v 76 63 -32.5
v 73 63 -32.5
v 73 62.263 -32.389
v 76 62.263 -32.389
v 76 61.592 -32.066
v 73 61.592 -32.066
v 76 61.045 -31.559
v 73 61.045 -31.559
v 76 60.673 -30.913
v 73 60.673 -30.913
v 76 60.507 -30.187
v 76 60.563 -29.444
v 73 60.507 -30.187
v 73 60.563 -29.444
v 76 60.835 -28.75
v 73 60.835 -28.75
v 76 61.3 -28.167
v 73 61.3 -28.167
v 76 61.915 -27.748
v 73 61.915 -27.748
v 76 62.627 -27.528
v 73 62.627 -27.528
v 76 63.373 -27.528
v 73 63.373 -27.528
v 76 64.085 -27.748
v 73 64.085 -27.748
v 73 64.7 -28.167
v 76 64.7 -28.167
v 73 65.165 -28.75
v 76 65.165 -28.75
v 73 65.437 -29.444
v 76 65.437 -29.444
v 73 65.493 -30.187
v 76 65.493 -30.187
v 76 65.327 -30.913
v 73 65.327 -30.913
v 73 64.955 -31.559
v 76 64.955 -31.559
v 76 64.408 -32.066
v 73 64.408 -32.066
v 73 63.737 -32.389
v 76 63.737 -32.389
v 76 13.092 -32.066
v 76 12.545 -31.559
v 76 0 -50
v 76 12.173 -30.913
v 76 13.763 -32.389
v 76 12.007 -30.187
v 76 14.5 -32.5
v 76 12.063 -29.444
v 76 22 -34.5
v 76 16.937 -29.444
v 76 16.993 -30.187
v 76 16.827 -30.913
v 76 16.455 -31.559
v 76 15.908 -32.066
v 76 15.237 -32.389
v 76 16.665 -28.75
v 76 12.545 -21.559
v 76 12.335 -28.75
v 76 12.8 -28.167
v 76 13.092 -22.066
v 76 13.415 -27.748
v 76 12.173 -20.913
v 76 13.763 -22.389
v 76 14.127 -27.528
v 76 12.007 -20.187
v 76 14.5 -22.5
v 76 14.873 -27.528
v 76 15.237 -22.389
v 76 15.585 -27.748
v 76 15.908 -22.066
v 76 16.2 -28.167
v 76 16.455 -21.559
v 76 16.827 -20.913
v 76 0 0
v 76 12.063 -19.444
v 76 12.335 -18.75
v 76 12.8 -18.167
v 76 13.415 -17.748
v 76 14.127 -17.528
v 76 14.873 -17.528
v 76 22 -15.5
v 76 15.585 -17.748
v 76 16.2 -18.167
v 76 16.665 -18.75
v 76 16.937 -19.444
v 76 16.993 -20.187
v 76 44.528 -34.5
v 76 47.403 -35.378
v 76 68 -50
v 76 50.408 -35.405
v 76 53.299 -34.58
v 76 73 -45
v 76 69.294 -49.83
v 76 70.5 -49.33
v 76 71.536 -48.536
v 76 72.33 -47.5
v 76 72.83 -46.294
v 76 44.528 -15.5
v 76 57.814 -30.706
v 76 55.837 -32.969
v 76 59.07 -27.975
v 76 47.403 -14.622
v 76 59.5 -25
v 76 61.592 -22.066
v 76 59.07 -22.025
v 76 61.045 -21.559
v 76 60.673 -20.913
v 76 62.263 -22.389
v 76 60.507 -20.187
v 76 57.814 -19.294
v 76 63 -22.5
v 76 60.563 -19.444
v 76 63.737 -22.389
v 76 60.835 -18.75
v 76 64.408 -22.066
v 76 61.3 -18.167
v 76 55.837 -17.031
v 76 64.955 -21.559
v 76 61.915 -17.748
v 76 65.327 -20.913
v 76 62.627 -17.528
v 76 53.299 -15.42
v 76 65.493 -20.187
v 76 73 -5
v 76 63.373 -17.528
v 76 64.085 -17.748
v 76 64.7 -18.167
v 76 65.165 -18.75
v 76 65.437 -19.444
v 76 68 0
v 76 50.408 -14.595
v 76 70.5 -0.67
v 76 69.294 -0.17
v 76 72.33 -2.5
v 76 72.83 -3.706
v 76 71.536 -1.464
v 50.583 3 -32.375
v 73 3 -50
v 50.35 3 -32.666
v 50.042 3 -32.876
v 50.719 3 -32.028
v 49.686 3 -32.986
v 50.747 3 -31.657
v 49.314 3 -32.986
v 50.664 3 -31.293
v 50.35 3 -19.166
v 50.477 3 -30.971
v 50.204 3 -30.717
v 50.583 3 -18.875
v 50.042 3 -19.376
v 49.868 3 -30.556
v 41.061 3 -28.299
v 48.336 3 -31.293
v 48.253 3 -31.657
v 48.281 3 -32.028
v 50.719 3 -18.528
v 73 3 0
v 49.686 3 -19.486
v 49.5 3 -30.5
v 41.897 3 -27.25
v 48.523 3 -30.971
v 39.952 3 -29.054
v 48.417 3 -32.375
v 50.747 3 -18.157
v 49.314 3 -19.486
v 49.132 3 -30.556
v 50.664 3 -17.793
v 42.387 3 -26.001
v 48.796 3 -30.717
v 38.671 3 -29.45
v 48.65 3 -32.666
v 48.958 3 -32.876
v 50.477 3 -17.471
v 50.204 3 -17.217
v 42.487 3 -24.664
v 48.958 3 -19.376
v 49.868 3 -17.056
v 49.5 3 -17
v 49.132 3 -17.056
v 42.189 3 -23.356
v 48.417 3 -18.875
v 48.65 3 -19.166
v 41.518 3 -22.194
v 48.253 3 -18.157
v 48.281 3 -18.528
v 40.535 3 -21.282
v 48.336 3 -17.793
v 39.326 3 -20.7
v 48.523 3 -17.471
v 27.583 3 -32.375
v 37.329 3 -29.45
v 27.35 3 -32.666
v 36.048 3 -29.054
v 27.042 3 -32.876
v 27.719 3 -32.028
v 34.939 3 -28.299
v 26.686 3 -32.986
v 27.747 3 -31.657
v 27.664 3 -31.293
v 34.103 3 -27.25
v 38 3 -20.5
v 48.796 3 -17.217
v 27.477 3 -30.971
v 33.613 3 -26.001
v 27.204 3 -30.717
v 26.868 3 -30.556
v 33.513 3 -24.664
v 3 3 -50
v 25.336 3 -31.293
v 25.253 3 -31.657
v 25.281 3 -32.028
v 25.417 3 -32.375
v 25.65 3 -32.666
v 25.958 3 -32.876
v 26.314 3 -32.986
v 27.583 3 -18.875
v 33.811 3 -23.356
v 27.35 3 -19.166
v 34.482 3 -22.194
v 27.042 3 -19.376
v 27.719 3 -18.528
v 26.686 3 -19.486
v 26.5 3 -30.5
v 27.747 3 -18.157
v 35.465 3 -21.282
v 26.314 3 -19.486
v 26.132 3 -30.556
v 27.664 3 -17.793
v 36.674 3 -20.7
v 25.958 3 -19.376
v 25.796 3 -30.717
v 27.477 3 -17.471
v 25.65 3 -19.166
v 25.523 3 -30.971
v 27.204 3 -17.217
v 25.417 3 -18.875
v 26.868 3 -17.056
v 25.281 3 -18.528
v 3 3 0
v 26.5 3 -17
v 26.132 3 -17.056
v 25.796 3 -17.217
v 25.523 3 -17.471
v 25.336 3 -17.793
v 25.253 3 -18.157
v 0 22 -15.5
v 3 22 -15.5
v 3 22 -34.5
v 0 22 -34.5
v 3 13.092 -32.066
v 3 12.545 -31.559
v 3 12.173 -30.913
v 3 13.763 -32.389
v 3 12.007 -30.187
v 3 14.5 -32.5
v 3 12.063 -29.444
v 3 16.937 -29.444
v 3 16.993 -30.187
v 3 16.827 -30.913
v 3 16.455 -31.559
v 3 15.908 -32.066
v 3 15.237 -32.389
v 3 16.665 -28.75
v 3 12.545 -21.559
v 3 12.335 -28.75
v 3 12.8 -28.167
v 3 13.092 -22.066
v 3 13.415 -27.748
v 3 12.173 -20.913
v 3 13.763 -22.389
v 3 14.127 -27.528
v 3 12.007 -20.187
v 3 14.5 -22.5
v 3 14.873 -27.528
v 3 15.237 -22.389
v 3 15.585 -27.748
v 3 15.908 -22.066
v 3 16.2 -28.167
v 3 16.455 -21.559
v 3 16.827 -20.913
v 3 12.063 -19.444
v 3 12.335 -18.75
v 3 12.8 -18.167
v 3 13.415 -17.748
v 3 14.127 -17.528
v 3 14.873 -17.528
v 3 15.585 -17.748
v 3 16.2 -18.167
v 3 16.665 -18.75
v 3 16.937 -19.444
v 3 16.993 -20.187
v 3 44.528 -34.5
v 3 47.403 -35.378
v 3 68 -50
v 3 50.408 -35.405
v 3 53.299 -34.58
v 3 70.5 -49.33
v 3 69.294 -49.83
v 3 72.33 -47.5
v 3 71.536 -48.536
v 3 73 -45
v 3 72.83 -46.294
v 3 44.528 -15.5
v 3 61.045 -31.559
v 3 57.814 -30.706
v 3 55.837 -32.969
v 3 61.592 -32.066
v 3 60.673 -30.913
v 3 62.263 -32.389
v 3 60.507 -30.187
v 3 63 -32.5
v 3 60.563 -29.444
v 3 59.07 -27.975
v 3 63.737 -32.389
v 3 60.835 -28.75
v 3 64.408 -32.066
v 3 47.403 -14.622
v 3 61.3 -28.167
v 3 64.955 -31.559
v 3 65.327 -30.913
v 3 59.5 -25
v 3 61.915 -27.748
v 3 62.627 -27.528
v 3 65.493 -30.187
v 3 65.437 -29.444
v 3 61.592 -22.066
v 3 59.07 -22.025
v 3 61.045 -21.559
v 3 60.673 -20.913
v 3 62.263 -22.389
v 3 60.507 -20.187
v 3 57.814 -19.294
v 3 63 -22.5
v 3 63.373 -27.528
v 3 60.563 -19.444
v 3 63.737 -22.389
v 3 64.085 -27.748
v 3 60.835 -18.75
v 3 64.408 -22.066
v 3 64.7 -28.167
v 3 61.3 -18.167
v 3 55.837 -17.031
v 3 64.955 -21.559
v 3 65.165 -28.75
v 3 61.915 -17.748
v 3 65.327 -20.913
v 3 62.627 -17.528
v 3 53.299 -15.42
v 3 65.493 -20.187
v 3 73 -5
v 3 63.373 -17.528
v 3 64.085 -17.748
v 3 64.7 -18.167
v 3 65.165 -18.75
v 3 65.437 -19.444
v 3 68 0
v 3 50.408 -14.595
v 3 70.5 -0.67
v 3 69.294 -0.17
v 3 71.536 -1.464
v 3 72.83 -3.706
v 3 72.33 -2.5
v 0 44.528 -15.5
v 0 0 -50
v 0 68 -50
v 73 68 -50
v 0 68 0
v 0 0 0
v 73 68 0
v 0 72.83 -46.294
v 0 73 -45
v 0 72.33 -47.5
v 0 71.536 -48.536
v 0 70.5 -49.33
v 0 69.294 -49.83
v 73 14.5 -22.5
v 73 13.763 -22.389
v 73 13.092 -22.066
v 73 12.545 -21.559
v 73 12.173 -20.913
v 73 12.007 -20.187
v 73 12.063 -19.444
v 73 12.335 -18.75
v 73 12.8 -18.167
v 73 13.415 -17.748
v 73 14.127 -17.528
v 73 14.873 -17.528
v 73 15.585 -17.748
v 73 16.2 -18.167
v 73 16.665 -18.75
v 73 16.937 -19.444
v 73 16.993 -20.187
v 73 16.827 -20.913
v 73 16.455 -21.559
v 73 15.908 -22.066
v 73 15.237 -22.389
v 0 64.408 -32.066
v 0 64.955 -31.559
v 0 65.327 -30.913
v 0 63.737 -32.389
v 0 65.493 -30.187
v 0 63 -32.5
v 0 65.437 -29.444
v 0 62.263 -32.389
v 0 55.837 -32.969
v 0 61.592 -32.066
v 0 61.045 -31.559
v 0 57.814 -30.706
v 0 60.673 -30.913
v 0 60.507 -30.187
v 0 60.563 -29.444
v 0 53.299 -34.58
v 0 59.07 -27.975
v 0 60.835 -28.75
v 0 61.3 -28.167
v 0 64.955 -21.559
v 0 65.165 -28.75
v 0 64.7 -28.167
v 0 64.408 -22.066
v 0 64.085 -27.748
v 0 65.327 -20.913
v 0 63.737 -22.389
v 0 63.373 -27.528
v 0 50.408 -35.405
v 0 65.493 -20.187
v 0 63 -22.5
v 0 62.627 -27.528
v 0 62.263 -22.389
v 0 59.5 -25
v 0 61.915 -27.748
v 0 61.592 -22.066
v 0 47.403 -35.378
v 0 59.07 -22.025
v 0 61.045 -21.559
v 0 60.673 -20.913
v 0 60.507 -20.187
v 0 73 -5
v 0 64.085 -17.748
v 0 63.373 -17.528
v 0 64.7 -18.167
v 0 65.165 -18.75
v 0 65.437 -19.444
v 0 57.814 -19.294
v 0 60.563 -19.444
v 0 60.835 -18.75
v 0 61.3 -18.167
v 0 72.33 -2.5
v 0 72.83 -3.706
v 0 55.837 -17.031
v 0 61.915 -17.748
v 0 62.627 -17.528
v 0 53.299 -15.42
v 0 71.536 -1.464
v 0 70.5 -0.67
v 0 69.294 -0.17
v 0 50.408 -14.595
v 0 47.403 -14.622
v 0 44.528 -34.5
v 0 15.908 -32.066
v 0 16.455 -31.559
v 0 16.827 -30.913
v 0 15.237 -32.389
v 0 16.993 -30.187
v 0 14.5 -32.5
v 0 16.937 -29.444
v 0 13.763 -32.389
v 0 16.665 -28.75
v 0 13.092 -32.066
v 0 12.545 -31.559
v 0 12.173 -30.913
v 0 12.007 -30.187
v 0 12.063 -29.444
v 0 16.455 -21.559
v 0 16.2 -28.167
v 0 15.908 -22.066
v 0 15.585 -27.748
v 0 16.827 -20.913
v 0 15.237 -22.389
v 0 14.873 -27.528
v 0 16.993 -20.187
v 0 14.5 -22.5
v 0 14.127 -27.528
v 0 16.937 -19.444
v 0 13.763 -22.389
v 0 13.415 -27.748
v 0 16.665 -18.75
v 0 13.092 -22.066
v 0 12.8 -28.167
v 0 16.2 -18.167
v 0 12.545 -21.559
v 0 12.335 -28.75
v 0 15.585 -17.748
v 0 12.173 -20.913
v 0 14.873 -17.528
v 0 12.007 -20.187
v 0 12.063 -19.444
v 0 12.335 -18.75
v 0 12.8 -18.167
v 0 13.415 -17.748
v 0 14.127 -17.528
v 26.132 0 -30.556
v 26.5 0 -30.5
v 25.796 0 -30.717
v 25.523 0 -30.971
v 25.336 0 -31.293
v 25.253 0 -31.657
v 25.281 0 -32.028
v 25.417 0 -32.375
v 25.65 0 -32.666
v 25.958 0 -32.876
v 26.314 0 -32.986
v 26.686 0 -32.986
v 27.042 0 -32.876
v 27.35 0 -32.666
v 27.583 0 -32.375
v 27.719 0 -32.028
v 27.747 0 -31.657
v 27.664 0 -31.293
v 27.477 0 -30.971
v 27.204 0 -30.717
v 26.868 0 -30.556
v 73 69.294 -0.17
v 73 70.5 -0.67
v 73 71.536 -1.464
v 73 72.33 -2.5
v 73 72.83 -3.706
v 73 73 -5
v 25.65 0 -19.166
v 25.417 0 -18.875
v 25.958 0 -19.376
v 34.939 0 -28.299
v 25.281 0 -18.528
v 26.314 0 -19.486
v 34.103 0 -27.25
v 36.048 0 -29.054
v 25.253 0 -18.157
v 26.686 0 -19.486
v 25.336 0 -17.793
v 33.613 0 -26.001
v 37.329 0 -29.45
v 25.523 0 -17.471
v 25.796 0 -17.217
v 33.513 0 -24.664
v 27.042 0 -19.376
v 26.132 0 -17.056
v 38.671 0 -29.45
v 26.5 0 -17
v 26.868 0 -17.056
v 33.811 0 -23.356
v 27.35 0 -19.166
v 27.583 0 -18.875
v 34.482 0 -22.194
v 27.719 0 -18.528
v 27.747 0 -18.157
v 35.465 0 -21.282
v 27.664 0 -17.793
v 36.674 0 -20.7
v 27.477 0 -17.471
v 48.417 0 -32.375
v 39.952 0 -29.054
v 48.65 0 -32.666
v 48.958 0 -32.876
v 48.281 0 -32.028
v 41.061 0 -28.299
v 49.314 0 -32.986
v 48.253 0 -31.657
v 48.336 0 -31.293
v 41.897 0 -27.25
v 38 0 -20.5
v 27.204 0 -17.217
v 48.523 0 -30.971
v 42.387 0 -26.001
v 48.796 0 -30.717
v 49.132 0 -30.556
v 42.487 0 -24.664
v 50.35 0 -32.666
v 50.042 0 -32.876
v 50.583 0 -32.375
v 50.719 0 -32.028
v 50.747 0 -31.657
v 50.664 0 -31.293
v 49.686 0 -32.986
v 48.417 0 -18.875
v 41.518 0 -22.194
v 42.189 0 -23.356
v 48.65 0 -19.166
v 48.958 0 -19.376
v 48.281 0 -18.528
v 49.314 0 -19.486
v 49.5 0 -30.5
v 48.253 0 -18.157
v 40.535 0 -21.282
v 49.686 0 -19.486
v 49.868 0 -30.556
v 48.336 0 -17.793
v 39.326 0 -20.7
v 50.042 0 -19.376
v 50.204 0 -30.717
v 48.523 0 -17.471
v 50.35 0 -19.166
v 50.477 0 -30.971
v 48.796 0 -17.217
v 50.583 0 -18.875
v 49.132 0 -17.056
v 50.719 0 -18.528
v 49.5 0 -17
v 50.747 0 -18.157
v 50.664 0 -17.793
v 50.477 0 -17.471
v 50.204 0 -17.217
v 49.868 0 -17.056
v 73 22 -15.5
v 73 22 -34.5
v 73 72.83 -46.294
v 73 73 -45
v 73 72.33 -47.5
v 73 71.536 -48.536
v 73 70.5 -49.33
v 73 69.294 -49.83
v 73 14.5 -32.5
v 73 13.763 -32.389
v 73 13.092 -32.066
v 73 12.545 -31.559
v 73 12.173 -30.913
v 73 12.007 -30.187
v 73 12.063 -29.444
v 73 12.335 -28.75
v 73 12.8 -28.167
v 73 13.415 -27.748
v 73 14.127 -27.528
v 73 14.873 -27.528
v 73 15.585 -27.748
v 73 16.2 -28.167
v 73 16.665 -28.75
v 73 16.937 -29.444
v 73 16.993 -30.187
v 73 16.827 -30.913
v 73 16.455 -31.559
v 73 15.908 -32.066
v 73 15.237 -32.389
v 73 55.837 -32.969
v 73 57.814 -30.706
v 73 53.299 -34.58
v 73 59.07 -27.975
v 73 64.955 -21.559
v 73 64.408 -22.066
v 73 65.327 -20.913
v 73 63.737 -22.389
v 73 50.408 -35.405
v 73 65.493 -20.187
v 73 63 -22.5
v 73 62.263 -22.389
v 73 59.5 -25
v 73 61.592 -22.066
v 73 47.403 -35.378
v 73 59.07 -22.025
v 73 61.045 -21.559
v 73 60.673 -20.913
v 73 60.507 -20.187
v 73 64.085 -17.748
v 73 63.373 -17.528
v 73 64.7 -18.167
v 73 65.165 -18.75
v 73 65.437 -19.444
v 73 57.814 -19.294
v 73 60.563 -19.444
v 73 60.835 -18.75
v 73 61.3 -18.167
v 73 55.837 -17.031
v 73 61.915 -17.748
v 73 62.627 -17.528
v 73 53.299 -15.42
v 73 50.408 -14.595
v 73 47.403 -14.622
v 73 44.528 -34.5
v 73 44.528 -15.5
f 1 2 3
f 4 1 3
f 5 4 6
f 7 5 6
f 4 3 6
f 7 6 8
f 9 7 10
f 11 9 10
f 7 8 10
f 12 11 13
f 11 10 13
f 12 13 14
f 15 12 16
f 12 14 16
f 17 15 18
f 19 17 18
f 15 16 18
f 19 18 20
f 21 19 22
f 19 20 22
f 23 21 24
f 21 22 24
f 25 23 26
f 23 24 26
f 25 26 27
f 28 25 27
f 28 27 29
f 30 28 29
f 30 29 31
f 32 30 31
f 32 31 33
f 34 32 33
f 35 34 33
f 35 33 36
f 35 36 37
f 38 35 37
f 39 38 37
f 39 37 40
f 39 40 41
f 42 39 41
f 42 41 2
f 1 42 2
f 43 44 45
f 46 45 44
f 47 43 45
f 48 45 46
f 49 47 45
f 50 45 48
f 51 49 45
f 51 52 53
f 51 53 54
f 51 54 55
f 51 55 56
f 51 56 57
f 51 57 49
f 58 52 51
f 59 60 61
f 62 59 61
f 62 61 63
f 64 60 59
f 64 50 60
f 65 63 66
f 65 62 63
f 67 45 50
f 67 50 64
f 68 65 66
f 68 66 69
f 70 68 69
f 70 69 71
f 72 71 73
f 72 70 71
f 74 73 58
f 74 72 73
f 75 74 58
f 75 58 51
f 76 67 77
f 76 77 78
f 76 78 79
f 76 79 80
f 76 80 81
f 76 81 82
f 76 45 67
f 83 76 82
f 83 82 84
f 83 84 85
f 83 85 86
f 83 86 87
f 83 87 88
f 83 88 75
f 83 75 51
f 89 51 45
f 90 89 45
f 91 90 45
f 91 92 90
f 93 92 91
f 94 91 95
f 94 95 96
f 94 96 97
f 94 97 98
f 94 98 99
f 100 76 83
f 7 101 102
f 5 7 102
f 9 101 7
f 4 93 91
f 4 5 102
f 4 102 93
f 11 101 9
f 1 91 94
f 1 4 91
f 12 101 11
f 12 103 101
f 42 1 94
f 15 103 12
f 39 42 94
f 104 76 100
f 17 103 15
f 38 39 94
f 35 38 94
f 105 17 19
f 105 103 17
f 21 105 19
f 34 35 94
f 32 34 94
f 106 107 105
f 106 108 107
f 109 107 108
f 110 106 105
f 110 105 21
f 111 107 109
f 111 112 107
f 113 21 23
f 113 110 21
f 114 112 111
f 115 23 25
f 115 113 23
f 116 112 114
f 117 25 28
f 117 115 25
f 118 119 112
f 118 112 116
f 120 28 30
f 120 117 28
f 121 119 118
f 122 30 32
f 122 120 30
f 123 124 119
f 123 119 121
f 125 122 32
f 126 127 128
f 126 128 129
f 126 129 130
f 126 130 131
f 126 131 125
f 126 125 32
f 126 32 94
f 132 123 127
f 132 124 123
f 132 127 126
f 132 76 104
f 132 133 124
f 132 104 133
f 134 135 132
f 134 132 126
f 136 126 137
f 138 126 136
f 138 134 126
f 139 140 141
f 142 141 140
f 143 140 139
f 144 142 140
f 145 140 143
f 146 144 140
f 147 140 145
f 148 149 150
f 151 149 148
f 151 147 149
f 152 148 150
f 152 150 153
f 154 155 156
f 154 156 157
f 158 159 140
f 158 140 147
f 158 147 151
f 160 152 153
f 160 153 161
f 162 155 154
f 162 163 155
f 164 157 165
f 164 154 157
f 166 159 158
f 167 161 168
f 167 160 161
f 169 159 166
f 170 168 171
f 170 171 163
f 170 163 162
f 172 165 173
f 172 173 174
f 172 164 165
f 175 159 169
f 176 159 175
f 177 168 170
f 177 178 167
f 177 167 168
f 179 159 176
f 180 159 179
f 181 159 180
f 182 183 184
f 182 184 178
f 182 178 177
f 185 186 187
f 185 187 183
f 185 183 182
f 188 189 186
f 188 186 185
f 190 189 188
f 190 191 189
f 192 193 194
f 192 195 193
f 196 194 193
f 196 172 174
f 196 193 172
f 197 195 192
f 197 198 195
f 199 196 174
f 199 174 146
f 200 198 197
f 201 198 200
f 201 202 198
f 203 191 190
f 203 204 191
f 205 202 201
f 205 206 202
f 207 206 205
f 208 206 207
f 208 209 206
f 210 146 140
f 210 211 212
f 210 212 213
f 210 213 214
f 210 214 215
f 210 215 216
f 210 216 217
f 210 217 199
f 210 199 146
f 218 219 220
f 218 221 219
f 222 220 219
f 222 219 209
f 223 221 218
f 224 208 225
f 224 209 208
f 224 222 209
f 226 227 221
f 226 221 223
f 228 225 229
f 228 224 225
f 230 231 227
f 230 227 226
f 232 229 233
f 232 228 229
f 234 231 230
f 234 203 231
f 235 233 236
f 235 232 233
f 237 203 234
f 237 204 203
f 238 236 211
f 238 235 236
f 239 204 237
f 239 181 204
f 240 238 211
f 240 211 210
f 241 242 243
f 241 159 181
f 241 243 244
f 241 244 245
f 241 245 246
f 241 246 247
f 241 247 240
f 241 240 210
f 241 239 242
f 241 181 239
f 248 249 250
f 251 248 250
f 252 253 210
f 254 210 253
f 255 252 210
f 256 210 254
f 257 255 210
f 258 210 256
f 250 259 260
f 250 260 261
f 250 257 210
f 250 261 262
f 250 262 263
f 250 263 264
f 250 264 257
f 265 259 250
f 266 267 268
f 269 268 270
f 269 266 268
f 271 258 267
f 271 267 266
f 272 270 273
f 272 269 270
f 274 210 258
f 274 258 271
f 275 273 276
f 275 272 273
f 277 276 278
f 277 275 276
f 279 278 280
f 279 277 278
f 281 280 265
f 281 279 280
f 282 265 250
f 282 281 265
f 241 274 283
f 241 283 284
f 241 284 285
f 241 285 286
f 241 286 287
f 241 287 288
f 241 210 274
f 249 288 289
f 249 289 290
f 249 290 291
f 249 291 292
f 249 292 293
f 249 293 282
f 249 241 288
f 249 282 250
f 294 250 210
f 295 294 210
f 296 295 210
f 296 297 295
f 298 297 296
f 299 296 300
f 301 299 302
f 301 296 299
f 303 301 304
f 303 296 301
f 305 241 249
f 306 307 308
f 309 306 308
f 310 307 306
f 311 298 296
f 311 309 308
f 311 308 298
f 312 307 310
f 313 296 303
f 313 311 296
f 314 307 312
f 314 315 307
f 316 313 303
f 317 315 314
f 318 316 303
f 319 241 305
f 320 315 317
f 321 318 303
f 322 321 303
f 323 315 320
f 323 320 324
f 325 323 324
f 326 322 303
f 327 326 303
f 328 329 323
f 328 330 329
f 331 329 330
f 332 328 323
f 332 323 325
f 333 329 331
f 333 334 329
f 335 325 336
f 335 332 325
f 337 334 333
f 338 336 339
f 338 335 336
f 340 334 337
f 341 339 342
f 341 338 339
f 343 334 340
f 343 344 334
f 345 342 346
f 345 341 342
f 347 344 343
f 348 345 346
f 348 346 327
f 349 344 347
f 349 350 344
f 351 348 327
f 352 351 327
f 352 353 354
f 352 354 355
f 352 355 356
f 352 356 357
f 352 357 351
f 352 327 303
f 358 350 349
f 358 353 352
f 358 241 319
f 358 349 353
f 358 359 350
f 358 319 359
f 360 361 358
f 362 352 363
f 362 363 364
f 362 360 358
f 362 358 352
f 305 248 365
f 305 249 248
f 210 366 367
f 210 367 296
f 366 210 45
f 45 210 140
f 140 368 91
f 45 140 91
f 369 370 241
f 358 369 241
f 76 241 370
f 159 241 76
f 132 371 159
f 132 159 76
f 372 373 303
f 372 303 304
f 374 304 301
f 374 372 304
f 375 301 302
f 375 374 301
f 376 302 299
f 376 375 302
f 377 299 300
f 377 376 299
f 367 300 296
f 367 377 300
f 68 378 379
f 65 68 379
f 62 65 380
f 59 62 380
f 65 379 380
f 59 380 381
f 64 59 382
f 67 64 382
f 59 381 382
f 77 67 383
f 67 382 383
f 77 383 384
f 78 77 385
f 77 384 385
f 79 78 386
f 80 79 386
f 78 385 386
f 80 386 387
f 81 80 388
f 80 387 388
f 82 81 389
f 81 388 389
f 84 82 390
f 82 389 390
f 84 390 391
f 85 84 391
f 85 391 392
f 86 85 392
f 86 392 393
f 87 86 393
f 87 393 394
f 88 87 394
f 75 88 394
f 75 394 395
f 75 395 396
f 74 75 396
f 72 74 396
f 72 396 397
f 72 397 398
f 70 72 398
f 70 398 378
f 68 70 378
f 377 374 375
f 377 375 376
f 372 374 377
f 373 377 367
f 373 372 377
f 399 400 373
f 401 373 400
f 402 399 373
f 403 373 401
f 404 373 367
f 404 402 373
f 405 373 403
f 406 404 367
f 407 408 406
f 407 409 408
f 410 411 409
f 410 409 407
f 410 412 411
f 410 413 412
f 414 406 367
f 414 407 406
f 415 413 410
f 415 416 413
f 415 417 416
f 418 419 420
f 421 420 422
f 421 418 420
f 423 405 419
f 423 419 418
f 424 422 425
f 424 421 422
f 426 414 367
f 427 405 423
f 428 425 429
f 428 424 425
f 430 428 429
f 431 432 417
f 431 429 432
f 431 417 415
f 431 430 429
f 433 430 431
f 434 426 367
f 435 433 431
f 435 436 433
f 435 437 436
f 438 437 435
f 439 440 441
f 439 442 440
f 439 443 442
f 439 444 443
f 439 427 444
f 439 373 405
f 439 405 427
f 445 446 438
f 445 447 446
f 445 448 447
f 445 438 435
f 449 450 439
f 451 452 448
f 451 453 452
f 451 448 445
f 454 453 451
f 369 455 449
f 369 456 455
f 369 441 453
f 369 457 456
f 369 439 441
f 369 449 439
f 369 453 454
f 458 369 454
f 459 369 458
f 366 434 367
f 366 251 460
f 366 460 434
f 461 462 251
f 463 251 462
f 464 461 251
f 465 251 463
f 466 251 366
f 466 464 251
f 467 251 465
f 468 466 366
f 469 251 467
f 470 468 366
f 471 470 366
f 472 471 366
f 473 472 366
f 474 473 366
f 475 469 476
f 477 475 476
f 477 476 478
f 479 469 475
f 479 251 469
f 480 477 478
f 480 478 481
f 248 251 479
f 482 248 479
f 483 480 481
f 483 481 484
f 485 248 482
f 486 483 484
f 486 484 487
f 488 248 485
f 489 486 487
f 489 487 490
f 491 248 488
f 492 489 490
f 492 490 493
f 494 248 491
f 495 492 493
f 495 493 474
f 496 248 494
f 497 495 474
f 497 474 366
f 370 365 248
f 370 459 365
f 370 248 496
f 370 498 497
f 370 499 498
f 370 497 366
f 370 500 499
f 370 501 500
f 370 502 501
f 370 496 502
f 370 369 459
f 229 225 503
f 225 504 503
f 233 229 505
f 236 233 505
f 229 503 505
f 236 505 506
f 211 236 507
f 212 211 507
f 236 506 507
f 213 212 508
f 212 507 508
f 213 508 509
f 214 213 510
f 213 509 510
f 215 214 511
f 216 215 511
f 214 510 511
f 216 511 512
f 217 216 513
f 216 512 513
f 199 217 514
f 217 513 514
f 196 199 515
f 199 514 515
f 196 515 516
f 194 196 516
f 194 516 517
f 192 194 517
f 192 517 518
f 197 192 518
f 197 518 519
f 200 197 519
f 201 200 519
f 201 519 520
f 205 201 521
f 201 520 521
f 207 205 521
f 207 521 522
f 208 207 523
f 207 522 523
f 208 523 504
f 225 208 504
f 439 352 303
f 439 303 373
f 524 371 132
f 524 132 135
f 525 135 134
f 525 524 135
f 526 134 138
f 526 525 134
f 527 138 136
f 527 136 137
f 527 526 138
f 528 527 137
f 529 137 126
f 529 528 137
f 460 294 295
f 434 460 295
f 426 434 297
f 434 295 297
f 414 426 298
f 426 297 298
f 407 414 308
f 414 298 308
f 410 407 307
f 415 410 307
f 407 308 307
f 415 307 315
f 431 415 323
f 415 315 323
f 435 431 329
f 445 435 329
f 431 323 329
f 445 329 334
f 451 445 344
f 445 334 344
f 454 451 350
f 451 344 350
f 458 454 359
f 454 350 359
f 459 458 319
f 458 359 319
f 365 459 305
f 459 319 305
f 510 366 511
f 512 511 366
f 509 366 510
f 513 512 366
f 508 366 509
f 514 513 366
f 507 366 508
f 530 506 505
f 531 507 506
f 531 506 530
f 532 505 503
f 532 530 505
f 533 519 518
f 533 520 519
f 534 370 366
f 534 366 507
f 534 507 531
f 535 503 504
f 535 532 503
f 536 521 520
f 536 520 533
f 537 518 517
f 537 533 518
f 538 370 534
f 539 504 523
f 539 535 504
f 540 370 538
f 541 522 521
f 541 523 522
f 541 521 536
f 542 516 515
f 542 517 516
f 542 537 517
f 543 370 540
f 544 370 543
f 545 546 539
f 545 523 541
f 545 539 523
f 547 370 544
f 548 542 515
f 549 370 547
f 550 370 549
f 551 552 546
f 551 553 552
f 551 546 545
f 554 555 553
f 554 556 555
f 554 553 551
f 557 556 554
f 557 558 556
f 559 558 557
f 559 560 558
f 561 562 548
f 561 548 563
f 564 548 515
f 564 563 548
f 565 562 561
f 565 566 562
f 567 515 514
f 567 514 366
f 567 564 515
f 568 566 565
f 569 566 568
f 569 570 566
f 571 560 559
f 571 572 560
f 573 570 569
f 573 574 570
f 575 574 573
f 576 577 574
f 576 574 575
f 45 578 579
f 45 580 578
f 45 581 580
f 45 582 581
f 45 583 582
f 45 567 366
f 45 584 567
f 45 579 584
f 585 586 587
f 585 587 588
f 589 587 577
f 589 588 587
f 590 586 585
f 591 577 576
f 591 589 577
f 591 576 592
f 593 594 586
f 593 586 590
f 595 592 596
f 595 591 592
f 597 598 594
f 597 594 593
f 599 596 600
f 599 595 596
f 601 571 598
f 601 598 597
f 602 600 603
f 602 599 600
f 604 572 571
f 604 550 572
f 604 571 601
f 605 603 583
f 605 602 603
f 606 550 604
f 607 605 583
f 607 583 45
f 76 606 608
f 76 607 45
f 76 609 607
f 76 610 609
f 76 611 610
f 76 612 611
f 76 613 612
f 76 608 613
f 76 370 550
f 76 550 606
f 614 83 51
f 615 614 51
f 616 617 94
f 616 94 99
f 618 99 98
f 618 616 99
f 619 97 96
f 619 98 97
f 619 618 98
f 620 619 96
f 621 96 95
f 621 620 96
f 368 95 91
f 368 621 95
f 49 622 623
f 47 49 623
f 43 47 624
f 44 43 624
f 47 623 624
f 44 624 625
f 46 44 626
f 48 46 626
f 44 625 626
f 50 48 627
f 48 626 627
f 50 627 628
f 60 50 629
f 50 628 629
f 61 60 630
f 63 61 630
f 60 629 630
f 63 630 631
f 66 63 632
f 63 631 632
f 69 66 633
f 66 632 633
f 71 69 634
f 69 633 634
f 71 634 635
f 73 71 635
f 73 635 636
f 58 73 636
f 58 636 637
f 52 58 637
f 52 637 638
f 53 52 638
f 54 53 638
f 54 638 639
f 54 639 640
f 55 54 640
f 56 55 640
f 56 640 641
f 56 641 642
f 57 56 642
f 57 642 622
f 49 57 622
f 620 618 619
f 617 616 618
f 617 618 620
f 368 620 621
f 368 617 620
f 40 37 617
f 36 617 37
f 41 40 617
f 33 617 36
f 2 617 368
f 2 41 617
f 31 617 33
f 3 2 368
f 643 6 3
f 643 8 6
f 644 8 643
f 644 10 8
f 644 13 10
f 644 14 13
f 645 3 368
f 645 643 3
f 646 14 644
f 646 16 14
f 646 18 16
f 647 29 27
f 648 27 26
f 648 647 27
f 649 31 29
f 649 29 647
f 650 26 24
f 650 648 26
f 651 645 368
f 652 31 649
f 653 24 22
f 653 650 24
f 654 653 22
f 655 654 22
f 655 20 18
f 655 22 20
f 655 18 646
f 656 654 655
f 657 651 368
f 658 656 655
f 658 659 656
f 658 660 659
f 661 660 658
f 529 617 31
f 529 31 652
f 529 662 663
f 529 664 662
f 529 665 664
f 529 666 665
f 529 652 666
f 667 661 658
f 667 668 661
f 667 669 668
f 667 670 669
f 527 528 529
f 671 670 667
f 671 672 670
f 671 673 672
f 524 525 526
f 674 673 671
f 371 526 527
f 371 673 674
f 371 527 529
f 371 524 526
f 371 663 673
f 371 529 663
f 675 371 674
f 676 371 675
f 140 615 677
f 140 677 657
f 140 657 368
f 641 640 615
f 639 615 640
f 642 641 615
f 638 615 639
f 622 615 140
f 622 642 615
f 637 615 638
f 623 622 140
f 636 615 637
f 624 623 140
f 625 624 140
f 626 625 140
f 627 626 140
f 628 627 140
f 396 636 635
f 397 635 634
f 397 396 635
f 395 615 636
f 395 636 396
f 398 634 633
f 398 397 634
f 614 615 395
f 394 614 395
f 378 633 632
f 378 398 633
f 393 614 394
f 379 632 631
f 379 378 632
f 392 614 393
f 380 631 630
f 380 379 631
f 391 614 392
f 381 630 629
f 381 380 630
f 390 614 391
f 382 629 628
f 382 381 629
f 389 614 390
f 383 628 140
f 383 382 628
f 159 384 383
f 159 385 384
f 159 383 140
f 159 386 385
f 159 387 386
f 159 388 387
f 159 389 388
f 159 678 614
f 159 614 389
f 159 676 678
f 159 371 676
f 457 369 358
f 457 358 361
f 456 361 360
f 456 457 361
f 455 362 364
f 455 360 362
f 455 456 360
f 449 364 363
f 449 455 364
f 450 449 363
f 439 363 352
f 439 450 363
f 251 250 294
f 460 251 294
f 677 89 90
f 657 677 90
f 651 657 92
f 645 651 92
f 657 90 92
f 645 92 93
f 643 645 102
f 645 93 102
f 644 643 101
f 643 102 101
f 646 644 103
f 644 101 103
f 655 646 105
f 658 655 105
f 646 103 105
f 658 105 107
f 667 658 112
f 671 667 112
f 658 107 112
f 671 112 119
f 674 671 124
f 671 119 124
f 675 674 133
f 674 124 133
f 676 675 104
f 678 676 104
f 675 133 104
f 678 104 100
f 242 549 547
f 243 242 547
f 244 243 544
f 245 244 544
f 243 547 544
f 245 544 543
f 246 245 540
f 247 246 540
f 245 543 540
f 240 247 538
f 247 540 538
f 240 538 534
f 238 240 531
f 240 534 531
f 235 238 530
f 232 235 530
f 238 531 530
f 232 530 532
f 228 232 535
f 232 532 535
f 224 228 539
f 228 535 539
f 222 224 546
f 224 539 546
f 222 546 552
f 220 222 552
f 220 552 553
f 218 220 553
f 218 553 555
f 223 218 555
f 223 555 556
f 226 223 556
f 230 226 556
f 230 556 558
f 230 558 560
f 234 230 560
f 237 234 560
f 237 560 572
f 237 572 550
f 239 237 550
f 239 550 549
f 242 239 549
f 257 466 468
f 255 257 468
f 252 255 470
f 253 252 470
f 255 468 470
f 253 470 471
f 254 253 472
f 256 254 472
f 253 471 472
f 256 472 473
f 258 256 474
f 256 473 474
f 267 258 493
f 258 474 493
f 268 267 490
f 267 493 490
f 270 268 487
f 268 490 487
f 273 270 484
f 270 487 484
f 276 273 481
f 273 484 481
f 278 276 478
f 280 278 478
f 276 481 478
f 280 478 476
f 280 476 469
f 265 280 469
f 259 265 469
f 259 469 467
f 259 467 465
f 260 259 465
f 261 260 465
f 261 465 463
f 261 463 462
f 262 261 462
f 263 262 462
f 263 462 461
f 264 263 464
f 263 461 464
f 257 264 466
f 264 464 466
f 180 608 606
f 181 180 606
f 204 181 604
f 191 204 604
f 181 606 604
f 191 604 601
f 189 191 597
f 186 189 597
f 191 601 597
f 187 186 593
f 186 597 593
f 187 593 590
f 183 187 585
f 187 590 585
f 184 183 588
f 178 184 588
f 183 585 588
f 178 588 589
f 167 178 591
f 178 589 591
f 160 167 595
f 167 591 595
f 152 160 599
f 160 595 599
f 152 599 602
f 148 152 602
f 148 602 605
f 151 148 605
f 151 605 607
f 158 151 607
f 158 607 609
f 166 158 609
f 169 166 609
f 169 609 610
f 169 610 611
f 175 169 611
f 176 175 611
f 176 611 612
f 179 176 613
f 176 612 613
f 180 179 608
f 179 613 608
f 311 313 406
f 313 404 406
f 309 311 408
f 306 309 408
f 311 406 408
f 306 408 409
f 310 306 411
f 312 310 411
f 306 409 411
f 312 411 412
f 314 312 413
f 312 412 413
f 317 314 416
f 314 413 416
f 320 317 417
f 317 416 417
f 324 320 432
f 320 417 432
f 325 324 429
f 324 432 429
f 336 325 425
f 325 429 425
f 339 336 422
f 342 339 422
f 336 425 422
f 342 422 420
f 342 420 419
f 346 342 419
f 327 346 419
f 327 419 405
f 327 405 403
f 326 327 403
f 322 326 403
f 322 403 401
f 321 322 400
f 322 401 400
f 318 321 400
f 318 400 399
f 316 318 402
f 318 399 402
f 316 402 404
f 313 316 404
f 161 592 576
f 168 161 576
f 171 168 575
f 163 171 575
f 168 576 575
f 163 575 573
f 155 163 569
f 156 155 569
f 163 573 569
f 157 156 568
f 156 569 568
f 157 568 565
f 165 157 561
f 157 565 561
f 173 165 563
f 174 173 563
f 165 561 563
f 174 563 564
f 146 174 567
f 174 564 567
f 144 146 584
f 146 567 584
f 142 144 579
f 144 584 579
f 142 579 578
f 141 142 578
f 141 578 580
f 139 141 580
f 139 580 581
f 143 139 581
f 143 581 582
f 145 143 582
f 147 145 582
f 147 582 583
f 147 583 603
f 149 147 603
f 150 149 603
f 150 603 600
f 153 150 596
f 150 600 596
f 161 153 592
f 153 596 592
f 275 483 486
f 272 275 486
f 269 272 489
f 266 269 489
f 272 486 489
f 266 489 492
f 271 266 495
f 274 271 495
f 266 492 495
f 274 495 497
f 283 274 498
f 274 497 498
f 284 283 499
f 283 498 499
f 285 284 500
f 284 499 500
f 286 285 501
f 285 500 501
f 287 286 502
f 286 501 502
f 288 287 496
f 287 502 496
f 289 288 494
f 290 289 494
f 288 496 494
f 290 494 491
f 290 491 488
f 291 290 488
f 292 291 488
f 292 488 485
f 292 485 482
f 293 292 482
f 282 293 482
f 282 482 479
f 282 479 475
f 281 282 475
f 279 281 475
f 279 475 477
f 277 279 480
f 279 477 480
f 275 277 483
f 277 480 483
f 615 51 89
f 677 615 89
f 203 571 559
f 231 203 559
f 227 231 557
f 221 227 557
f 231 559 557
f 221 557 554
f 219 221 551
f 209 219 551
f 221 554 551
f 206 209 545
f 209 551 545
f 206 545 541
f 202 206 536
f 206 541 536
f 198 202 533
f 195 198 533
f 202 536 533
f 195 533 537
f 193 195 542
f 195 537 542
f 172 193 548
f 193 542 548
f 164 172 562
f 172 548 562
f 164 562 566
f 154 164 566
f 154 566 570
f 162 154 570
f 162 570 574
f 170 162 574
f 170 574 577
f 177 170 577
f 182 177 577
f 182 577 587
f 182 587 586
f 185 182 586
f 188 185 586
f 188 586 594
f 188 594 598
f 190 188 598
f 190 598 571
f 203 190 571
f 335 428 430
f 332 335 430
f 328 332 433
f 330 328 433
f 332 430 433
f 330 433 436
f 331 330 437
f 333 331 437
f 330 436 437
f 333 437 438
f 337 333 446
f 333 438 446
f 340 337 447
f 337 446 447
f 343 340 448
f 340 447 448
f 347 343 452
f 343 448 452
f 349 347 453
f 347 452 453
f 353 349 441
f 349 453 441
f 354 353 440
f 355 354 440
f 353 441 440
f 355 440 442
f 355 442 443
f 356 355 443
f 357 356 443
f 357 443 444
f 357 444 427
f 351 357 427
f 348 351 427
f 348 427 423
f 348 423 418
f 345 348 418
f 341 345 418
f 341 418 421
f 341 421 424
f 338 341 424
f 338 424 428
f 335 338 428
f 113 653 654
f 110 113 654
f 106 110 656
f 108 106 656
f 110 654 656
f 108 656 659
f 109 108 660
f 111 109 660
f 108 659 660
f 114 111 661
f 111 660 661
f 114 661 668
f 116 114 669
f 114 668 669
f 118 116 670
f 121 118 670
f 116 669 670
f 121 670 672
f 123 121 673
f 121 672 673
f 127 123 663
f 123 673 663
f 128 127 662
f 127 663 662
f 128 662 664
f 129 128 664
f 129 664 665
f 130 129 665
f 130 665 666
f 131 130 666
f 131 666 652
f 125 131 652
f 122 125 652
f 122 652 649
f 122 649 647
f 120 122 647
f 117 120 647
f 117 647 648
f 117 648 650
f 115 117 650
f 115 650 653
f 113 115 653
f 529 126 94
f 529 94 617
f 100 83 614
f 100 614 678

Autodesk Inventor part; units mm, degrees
ref_plane "YZ Plane" through (0, 0, 0) normal (1, 0, 0) x (0, 1, 0)
ref_plane "XZ Plane" through (0, 0, 0) normal (0, 1, 0) x (-1, 0, 0)
ref_plane "XY Plane" through (0, 0, 0) normal (0, 0, 1) x (1, 0, 0)
sketch "Boceto1" plane through (0, 0, 0) normal (0, 0, 1) x (1, 0, 0)
  line L0 (0, 0) -> (76, 0)
  line L1 (76, 0) -> (76, 73)
  line L2 (76, 73) -> (73, 73)
  line L3 (73, 73) -> (73, 3)
  line L4 (73, 3) -> (3, 3)
  line L5 (3, 3) -> (3, 73)
  line L6 (3, 73) -> (0, 73)
  line L7 (0, 73) -> (0, 0)
extrude "Extrusión1" add sketch "Boceto1" against normal blind 50
sketch "Boceto2" plane through (76, 0, 0) normal (1, 0, 0) x (0, 0, -1)
  circle A0 centre (25, 49) radius 6.5
  circle A1 centre (20, 63) radius 2.5
  circle A2 centre (30, 63) radius 2.5
  circle A3 centre (20, 14.5) radius 2.5
  circle A4 centre (30, 14.5) radius 2.5
  point P0 (0, 0)
  point P1 (0, 73)
hole "Agujero1" at (76, 63, -20) at (76, 63, -30) at (76, 14.5, -20) at (76, 14.5, -30) direction (-1, 0, 0) diameter 5 end through all
hole "Agujero2" at (76, 49, -25) direction (-1, 0, 0) diameter 13 end through all
sketch "Boceto3" plane through (3, 3, 0) normal (0, 1, 0) x (1, 0, 0)
  circle A0 centre (35, 25) radius 4.5
  circle A1 centre (46.5, 31.75) radius 1.25
  circle A2 centre (46.5, 18.25) radius 1.25
  circle A3 centre (23.5, 31.75) radius 1.25
  circle A4 centre (23.5, 18.25) radius 1.25
hole "Agujero3" at (38, 3, -25) direction (0, -1, 0) diameter 9 end through all
hole "Agujero4" at (26.5, 3, -18.25) at (26.5, 3, -31.75) at (49.5, 3, -31.75) at (49.5, 3, -18.25) direction (0, -1, 0) diameter 2.5 end through all
fillet "Empalme1" radius 5 4 edges at (1.5, 73, 0) (1.5, 73, -50) (74.5, 73, 0) (74.5, 73, -50)
sketch "Boceto4" plane through (76, 0, 0) normal (1, 0, 0) x (0, 0, -1)
  circle A0 centre (25, 49) radius 6.5 projected
  arc A1 (34.5, 44.5279) -> (15.5, 44.5279) centre (25, 49) ccw
  line L0 (25, 22) -> (34.5, 22)
  line L1 (34.5, 22) -> (34.5, 44.5279)
  line L2 (25, 22) -> (15.5, 22)
  line L3 (15.5, 22) -> (15.5, 44.5279)
  point P0 (0, 0)
  dimension "d68" = 9.5
  dimension "d69" = 9.5
extrude "Extrusión2" cut sketch "Boceto4" against normal blind 100 contours A0 | L1 L0 L2 L3 A1
properties part number "7"
